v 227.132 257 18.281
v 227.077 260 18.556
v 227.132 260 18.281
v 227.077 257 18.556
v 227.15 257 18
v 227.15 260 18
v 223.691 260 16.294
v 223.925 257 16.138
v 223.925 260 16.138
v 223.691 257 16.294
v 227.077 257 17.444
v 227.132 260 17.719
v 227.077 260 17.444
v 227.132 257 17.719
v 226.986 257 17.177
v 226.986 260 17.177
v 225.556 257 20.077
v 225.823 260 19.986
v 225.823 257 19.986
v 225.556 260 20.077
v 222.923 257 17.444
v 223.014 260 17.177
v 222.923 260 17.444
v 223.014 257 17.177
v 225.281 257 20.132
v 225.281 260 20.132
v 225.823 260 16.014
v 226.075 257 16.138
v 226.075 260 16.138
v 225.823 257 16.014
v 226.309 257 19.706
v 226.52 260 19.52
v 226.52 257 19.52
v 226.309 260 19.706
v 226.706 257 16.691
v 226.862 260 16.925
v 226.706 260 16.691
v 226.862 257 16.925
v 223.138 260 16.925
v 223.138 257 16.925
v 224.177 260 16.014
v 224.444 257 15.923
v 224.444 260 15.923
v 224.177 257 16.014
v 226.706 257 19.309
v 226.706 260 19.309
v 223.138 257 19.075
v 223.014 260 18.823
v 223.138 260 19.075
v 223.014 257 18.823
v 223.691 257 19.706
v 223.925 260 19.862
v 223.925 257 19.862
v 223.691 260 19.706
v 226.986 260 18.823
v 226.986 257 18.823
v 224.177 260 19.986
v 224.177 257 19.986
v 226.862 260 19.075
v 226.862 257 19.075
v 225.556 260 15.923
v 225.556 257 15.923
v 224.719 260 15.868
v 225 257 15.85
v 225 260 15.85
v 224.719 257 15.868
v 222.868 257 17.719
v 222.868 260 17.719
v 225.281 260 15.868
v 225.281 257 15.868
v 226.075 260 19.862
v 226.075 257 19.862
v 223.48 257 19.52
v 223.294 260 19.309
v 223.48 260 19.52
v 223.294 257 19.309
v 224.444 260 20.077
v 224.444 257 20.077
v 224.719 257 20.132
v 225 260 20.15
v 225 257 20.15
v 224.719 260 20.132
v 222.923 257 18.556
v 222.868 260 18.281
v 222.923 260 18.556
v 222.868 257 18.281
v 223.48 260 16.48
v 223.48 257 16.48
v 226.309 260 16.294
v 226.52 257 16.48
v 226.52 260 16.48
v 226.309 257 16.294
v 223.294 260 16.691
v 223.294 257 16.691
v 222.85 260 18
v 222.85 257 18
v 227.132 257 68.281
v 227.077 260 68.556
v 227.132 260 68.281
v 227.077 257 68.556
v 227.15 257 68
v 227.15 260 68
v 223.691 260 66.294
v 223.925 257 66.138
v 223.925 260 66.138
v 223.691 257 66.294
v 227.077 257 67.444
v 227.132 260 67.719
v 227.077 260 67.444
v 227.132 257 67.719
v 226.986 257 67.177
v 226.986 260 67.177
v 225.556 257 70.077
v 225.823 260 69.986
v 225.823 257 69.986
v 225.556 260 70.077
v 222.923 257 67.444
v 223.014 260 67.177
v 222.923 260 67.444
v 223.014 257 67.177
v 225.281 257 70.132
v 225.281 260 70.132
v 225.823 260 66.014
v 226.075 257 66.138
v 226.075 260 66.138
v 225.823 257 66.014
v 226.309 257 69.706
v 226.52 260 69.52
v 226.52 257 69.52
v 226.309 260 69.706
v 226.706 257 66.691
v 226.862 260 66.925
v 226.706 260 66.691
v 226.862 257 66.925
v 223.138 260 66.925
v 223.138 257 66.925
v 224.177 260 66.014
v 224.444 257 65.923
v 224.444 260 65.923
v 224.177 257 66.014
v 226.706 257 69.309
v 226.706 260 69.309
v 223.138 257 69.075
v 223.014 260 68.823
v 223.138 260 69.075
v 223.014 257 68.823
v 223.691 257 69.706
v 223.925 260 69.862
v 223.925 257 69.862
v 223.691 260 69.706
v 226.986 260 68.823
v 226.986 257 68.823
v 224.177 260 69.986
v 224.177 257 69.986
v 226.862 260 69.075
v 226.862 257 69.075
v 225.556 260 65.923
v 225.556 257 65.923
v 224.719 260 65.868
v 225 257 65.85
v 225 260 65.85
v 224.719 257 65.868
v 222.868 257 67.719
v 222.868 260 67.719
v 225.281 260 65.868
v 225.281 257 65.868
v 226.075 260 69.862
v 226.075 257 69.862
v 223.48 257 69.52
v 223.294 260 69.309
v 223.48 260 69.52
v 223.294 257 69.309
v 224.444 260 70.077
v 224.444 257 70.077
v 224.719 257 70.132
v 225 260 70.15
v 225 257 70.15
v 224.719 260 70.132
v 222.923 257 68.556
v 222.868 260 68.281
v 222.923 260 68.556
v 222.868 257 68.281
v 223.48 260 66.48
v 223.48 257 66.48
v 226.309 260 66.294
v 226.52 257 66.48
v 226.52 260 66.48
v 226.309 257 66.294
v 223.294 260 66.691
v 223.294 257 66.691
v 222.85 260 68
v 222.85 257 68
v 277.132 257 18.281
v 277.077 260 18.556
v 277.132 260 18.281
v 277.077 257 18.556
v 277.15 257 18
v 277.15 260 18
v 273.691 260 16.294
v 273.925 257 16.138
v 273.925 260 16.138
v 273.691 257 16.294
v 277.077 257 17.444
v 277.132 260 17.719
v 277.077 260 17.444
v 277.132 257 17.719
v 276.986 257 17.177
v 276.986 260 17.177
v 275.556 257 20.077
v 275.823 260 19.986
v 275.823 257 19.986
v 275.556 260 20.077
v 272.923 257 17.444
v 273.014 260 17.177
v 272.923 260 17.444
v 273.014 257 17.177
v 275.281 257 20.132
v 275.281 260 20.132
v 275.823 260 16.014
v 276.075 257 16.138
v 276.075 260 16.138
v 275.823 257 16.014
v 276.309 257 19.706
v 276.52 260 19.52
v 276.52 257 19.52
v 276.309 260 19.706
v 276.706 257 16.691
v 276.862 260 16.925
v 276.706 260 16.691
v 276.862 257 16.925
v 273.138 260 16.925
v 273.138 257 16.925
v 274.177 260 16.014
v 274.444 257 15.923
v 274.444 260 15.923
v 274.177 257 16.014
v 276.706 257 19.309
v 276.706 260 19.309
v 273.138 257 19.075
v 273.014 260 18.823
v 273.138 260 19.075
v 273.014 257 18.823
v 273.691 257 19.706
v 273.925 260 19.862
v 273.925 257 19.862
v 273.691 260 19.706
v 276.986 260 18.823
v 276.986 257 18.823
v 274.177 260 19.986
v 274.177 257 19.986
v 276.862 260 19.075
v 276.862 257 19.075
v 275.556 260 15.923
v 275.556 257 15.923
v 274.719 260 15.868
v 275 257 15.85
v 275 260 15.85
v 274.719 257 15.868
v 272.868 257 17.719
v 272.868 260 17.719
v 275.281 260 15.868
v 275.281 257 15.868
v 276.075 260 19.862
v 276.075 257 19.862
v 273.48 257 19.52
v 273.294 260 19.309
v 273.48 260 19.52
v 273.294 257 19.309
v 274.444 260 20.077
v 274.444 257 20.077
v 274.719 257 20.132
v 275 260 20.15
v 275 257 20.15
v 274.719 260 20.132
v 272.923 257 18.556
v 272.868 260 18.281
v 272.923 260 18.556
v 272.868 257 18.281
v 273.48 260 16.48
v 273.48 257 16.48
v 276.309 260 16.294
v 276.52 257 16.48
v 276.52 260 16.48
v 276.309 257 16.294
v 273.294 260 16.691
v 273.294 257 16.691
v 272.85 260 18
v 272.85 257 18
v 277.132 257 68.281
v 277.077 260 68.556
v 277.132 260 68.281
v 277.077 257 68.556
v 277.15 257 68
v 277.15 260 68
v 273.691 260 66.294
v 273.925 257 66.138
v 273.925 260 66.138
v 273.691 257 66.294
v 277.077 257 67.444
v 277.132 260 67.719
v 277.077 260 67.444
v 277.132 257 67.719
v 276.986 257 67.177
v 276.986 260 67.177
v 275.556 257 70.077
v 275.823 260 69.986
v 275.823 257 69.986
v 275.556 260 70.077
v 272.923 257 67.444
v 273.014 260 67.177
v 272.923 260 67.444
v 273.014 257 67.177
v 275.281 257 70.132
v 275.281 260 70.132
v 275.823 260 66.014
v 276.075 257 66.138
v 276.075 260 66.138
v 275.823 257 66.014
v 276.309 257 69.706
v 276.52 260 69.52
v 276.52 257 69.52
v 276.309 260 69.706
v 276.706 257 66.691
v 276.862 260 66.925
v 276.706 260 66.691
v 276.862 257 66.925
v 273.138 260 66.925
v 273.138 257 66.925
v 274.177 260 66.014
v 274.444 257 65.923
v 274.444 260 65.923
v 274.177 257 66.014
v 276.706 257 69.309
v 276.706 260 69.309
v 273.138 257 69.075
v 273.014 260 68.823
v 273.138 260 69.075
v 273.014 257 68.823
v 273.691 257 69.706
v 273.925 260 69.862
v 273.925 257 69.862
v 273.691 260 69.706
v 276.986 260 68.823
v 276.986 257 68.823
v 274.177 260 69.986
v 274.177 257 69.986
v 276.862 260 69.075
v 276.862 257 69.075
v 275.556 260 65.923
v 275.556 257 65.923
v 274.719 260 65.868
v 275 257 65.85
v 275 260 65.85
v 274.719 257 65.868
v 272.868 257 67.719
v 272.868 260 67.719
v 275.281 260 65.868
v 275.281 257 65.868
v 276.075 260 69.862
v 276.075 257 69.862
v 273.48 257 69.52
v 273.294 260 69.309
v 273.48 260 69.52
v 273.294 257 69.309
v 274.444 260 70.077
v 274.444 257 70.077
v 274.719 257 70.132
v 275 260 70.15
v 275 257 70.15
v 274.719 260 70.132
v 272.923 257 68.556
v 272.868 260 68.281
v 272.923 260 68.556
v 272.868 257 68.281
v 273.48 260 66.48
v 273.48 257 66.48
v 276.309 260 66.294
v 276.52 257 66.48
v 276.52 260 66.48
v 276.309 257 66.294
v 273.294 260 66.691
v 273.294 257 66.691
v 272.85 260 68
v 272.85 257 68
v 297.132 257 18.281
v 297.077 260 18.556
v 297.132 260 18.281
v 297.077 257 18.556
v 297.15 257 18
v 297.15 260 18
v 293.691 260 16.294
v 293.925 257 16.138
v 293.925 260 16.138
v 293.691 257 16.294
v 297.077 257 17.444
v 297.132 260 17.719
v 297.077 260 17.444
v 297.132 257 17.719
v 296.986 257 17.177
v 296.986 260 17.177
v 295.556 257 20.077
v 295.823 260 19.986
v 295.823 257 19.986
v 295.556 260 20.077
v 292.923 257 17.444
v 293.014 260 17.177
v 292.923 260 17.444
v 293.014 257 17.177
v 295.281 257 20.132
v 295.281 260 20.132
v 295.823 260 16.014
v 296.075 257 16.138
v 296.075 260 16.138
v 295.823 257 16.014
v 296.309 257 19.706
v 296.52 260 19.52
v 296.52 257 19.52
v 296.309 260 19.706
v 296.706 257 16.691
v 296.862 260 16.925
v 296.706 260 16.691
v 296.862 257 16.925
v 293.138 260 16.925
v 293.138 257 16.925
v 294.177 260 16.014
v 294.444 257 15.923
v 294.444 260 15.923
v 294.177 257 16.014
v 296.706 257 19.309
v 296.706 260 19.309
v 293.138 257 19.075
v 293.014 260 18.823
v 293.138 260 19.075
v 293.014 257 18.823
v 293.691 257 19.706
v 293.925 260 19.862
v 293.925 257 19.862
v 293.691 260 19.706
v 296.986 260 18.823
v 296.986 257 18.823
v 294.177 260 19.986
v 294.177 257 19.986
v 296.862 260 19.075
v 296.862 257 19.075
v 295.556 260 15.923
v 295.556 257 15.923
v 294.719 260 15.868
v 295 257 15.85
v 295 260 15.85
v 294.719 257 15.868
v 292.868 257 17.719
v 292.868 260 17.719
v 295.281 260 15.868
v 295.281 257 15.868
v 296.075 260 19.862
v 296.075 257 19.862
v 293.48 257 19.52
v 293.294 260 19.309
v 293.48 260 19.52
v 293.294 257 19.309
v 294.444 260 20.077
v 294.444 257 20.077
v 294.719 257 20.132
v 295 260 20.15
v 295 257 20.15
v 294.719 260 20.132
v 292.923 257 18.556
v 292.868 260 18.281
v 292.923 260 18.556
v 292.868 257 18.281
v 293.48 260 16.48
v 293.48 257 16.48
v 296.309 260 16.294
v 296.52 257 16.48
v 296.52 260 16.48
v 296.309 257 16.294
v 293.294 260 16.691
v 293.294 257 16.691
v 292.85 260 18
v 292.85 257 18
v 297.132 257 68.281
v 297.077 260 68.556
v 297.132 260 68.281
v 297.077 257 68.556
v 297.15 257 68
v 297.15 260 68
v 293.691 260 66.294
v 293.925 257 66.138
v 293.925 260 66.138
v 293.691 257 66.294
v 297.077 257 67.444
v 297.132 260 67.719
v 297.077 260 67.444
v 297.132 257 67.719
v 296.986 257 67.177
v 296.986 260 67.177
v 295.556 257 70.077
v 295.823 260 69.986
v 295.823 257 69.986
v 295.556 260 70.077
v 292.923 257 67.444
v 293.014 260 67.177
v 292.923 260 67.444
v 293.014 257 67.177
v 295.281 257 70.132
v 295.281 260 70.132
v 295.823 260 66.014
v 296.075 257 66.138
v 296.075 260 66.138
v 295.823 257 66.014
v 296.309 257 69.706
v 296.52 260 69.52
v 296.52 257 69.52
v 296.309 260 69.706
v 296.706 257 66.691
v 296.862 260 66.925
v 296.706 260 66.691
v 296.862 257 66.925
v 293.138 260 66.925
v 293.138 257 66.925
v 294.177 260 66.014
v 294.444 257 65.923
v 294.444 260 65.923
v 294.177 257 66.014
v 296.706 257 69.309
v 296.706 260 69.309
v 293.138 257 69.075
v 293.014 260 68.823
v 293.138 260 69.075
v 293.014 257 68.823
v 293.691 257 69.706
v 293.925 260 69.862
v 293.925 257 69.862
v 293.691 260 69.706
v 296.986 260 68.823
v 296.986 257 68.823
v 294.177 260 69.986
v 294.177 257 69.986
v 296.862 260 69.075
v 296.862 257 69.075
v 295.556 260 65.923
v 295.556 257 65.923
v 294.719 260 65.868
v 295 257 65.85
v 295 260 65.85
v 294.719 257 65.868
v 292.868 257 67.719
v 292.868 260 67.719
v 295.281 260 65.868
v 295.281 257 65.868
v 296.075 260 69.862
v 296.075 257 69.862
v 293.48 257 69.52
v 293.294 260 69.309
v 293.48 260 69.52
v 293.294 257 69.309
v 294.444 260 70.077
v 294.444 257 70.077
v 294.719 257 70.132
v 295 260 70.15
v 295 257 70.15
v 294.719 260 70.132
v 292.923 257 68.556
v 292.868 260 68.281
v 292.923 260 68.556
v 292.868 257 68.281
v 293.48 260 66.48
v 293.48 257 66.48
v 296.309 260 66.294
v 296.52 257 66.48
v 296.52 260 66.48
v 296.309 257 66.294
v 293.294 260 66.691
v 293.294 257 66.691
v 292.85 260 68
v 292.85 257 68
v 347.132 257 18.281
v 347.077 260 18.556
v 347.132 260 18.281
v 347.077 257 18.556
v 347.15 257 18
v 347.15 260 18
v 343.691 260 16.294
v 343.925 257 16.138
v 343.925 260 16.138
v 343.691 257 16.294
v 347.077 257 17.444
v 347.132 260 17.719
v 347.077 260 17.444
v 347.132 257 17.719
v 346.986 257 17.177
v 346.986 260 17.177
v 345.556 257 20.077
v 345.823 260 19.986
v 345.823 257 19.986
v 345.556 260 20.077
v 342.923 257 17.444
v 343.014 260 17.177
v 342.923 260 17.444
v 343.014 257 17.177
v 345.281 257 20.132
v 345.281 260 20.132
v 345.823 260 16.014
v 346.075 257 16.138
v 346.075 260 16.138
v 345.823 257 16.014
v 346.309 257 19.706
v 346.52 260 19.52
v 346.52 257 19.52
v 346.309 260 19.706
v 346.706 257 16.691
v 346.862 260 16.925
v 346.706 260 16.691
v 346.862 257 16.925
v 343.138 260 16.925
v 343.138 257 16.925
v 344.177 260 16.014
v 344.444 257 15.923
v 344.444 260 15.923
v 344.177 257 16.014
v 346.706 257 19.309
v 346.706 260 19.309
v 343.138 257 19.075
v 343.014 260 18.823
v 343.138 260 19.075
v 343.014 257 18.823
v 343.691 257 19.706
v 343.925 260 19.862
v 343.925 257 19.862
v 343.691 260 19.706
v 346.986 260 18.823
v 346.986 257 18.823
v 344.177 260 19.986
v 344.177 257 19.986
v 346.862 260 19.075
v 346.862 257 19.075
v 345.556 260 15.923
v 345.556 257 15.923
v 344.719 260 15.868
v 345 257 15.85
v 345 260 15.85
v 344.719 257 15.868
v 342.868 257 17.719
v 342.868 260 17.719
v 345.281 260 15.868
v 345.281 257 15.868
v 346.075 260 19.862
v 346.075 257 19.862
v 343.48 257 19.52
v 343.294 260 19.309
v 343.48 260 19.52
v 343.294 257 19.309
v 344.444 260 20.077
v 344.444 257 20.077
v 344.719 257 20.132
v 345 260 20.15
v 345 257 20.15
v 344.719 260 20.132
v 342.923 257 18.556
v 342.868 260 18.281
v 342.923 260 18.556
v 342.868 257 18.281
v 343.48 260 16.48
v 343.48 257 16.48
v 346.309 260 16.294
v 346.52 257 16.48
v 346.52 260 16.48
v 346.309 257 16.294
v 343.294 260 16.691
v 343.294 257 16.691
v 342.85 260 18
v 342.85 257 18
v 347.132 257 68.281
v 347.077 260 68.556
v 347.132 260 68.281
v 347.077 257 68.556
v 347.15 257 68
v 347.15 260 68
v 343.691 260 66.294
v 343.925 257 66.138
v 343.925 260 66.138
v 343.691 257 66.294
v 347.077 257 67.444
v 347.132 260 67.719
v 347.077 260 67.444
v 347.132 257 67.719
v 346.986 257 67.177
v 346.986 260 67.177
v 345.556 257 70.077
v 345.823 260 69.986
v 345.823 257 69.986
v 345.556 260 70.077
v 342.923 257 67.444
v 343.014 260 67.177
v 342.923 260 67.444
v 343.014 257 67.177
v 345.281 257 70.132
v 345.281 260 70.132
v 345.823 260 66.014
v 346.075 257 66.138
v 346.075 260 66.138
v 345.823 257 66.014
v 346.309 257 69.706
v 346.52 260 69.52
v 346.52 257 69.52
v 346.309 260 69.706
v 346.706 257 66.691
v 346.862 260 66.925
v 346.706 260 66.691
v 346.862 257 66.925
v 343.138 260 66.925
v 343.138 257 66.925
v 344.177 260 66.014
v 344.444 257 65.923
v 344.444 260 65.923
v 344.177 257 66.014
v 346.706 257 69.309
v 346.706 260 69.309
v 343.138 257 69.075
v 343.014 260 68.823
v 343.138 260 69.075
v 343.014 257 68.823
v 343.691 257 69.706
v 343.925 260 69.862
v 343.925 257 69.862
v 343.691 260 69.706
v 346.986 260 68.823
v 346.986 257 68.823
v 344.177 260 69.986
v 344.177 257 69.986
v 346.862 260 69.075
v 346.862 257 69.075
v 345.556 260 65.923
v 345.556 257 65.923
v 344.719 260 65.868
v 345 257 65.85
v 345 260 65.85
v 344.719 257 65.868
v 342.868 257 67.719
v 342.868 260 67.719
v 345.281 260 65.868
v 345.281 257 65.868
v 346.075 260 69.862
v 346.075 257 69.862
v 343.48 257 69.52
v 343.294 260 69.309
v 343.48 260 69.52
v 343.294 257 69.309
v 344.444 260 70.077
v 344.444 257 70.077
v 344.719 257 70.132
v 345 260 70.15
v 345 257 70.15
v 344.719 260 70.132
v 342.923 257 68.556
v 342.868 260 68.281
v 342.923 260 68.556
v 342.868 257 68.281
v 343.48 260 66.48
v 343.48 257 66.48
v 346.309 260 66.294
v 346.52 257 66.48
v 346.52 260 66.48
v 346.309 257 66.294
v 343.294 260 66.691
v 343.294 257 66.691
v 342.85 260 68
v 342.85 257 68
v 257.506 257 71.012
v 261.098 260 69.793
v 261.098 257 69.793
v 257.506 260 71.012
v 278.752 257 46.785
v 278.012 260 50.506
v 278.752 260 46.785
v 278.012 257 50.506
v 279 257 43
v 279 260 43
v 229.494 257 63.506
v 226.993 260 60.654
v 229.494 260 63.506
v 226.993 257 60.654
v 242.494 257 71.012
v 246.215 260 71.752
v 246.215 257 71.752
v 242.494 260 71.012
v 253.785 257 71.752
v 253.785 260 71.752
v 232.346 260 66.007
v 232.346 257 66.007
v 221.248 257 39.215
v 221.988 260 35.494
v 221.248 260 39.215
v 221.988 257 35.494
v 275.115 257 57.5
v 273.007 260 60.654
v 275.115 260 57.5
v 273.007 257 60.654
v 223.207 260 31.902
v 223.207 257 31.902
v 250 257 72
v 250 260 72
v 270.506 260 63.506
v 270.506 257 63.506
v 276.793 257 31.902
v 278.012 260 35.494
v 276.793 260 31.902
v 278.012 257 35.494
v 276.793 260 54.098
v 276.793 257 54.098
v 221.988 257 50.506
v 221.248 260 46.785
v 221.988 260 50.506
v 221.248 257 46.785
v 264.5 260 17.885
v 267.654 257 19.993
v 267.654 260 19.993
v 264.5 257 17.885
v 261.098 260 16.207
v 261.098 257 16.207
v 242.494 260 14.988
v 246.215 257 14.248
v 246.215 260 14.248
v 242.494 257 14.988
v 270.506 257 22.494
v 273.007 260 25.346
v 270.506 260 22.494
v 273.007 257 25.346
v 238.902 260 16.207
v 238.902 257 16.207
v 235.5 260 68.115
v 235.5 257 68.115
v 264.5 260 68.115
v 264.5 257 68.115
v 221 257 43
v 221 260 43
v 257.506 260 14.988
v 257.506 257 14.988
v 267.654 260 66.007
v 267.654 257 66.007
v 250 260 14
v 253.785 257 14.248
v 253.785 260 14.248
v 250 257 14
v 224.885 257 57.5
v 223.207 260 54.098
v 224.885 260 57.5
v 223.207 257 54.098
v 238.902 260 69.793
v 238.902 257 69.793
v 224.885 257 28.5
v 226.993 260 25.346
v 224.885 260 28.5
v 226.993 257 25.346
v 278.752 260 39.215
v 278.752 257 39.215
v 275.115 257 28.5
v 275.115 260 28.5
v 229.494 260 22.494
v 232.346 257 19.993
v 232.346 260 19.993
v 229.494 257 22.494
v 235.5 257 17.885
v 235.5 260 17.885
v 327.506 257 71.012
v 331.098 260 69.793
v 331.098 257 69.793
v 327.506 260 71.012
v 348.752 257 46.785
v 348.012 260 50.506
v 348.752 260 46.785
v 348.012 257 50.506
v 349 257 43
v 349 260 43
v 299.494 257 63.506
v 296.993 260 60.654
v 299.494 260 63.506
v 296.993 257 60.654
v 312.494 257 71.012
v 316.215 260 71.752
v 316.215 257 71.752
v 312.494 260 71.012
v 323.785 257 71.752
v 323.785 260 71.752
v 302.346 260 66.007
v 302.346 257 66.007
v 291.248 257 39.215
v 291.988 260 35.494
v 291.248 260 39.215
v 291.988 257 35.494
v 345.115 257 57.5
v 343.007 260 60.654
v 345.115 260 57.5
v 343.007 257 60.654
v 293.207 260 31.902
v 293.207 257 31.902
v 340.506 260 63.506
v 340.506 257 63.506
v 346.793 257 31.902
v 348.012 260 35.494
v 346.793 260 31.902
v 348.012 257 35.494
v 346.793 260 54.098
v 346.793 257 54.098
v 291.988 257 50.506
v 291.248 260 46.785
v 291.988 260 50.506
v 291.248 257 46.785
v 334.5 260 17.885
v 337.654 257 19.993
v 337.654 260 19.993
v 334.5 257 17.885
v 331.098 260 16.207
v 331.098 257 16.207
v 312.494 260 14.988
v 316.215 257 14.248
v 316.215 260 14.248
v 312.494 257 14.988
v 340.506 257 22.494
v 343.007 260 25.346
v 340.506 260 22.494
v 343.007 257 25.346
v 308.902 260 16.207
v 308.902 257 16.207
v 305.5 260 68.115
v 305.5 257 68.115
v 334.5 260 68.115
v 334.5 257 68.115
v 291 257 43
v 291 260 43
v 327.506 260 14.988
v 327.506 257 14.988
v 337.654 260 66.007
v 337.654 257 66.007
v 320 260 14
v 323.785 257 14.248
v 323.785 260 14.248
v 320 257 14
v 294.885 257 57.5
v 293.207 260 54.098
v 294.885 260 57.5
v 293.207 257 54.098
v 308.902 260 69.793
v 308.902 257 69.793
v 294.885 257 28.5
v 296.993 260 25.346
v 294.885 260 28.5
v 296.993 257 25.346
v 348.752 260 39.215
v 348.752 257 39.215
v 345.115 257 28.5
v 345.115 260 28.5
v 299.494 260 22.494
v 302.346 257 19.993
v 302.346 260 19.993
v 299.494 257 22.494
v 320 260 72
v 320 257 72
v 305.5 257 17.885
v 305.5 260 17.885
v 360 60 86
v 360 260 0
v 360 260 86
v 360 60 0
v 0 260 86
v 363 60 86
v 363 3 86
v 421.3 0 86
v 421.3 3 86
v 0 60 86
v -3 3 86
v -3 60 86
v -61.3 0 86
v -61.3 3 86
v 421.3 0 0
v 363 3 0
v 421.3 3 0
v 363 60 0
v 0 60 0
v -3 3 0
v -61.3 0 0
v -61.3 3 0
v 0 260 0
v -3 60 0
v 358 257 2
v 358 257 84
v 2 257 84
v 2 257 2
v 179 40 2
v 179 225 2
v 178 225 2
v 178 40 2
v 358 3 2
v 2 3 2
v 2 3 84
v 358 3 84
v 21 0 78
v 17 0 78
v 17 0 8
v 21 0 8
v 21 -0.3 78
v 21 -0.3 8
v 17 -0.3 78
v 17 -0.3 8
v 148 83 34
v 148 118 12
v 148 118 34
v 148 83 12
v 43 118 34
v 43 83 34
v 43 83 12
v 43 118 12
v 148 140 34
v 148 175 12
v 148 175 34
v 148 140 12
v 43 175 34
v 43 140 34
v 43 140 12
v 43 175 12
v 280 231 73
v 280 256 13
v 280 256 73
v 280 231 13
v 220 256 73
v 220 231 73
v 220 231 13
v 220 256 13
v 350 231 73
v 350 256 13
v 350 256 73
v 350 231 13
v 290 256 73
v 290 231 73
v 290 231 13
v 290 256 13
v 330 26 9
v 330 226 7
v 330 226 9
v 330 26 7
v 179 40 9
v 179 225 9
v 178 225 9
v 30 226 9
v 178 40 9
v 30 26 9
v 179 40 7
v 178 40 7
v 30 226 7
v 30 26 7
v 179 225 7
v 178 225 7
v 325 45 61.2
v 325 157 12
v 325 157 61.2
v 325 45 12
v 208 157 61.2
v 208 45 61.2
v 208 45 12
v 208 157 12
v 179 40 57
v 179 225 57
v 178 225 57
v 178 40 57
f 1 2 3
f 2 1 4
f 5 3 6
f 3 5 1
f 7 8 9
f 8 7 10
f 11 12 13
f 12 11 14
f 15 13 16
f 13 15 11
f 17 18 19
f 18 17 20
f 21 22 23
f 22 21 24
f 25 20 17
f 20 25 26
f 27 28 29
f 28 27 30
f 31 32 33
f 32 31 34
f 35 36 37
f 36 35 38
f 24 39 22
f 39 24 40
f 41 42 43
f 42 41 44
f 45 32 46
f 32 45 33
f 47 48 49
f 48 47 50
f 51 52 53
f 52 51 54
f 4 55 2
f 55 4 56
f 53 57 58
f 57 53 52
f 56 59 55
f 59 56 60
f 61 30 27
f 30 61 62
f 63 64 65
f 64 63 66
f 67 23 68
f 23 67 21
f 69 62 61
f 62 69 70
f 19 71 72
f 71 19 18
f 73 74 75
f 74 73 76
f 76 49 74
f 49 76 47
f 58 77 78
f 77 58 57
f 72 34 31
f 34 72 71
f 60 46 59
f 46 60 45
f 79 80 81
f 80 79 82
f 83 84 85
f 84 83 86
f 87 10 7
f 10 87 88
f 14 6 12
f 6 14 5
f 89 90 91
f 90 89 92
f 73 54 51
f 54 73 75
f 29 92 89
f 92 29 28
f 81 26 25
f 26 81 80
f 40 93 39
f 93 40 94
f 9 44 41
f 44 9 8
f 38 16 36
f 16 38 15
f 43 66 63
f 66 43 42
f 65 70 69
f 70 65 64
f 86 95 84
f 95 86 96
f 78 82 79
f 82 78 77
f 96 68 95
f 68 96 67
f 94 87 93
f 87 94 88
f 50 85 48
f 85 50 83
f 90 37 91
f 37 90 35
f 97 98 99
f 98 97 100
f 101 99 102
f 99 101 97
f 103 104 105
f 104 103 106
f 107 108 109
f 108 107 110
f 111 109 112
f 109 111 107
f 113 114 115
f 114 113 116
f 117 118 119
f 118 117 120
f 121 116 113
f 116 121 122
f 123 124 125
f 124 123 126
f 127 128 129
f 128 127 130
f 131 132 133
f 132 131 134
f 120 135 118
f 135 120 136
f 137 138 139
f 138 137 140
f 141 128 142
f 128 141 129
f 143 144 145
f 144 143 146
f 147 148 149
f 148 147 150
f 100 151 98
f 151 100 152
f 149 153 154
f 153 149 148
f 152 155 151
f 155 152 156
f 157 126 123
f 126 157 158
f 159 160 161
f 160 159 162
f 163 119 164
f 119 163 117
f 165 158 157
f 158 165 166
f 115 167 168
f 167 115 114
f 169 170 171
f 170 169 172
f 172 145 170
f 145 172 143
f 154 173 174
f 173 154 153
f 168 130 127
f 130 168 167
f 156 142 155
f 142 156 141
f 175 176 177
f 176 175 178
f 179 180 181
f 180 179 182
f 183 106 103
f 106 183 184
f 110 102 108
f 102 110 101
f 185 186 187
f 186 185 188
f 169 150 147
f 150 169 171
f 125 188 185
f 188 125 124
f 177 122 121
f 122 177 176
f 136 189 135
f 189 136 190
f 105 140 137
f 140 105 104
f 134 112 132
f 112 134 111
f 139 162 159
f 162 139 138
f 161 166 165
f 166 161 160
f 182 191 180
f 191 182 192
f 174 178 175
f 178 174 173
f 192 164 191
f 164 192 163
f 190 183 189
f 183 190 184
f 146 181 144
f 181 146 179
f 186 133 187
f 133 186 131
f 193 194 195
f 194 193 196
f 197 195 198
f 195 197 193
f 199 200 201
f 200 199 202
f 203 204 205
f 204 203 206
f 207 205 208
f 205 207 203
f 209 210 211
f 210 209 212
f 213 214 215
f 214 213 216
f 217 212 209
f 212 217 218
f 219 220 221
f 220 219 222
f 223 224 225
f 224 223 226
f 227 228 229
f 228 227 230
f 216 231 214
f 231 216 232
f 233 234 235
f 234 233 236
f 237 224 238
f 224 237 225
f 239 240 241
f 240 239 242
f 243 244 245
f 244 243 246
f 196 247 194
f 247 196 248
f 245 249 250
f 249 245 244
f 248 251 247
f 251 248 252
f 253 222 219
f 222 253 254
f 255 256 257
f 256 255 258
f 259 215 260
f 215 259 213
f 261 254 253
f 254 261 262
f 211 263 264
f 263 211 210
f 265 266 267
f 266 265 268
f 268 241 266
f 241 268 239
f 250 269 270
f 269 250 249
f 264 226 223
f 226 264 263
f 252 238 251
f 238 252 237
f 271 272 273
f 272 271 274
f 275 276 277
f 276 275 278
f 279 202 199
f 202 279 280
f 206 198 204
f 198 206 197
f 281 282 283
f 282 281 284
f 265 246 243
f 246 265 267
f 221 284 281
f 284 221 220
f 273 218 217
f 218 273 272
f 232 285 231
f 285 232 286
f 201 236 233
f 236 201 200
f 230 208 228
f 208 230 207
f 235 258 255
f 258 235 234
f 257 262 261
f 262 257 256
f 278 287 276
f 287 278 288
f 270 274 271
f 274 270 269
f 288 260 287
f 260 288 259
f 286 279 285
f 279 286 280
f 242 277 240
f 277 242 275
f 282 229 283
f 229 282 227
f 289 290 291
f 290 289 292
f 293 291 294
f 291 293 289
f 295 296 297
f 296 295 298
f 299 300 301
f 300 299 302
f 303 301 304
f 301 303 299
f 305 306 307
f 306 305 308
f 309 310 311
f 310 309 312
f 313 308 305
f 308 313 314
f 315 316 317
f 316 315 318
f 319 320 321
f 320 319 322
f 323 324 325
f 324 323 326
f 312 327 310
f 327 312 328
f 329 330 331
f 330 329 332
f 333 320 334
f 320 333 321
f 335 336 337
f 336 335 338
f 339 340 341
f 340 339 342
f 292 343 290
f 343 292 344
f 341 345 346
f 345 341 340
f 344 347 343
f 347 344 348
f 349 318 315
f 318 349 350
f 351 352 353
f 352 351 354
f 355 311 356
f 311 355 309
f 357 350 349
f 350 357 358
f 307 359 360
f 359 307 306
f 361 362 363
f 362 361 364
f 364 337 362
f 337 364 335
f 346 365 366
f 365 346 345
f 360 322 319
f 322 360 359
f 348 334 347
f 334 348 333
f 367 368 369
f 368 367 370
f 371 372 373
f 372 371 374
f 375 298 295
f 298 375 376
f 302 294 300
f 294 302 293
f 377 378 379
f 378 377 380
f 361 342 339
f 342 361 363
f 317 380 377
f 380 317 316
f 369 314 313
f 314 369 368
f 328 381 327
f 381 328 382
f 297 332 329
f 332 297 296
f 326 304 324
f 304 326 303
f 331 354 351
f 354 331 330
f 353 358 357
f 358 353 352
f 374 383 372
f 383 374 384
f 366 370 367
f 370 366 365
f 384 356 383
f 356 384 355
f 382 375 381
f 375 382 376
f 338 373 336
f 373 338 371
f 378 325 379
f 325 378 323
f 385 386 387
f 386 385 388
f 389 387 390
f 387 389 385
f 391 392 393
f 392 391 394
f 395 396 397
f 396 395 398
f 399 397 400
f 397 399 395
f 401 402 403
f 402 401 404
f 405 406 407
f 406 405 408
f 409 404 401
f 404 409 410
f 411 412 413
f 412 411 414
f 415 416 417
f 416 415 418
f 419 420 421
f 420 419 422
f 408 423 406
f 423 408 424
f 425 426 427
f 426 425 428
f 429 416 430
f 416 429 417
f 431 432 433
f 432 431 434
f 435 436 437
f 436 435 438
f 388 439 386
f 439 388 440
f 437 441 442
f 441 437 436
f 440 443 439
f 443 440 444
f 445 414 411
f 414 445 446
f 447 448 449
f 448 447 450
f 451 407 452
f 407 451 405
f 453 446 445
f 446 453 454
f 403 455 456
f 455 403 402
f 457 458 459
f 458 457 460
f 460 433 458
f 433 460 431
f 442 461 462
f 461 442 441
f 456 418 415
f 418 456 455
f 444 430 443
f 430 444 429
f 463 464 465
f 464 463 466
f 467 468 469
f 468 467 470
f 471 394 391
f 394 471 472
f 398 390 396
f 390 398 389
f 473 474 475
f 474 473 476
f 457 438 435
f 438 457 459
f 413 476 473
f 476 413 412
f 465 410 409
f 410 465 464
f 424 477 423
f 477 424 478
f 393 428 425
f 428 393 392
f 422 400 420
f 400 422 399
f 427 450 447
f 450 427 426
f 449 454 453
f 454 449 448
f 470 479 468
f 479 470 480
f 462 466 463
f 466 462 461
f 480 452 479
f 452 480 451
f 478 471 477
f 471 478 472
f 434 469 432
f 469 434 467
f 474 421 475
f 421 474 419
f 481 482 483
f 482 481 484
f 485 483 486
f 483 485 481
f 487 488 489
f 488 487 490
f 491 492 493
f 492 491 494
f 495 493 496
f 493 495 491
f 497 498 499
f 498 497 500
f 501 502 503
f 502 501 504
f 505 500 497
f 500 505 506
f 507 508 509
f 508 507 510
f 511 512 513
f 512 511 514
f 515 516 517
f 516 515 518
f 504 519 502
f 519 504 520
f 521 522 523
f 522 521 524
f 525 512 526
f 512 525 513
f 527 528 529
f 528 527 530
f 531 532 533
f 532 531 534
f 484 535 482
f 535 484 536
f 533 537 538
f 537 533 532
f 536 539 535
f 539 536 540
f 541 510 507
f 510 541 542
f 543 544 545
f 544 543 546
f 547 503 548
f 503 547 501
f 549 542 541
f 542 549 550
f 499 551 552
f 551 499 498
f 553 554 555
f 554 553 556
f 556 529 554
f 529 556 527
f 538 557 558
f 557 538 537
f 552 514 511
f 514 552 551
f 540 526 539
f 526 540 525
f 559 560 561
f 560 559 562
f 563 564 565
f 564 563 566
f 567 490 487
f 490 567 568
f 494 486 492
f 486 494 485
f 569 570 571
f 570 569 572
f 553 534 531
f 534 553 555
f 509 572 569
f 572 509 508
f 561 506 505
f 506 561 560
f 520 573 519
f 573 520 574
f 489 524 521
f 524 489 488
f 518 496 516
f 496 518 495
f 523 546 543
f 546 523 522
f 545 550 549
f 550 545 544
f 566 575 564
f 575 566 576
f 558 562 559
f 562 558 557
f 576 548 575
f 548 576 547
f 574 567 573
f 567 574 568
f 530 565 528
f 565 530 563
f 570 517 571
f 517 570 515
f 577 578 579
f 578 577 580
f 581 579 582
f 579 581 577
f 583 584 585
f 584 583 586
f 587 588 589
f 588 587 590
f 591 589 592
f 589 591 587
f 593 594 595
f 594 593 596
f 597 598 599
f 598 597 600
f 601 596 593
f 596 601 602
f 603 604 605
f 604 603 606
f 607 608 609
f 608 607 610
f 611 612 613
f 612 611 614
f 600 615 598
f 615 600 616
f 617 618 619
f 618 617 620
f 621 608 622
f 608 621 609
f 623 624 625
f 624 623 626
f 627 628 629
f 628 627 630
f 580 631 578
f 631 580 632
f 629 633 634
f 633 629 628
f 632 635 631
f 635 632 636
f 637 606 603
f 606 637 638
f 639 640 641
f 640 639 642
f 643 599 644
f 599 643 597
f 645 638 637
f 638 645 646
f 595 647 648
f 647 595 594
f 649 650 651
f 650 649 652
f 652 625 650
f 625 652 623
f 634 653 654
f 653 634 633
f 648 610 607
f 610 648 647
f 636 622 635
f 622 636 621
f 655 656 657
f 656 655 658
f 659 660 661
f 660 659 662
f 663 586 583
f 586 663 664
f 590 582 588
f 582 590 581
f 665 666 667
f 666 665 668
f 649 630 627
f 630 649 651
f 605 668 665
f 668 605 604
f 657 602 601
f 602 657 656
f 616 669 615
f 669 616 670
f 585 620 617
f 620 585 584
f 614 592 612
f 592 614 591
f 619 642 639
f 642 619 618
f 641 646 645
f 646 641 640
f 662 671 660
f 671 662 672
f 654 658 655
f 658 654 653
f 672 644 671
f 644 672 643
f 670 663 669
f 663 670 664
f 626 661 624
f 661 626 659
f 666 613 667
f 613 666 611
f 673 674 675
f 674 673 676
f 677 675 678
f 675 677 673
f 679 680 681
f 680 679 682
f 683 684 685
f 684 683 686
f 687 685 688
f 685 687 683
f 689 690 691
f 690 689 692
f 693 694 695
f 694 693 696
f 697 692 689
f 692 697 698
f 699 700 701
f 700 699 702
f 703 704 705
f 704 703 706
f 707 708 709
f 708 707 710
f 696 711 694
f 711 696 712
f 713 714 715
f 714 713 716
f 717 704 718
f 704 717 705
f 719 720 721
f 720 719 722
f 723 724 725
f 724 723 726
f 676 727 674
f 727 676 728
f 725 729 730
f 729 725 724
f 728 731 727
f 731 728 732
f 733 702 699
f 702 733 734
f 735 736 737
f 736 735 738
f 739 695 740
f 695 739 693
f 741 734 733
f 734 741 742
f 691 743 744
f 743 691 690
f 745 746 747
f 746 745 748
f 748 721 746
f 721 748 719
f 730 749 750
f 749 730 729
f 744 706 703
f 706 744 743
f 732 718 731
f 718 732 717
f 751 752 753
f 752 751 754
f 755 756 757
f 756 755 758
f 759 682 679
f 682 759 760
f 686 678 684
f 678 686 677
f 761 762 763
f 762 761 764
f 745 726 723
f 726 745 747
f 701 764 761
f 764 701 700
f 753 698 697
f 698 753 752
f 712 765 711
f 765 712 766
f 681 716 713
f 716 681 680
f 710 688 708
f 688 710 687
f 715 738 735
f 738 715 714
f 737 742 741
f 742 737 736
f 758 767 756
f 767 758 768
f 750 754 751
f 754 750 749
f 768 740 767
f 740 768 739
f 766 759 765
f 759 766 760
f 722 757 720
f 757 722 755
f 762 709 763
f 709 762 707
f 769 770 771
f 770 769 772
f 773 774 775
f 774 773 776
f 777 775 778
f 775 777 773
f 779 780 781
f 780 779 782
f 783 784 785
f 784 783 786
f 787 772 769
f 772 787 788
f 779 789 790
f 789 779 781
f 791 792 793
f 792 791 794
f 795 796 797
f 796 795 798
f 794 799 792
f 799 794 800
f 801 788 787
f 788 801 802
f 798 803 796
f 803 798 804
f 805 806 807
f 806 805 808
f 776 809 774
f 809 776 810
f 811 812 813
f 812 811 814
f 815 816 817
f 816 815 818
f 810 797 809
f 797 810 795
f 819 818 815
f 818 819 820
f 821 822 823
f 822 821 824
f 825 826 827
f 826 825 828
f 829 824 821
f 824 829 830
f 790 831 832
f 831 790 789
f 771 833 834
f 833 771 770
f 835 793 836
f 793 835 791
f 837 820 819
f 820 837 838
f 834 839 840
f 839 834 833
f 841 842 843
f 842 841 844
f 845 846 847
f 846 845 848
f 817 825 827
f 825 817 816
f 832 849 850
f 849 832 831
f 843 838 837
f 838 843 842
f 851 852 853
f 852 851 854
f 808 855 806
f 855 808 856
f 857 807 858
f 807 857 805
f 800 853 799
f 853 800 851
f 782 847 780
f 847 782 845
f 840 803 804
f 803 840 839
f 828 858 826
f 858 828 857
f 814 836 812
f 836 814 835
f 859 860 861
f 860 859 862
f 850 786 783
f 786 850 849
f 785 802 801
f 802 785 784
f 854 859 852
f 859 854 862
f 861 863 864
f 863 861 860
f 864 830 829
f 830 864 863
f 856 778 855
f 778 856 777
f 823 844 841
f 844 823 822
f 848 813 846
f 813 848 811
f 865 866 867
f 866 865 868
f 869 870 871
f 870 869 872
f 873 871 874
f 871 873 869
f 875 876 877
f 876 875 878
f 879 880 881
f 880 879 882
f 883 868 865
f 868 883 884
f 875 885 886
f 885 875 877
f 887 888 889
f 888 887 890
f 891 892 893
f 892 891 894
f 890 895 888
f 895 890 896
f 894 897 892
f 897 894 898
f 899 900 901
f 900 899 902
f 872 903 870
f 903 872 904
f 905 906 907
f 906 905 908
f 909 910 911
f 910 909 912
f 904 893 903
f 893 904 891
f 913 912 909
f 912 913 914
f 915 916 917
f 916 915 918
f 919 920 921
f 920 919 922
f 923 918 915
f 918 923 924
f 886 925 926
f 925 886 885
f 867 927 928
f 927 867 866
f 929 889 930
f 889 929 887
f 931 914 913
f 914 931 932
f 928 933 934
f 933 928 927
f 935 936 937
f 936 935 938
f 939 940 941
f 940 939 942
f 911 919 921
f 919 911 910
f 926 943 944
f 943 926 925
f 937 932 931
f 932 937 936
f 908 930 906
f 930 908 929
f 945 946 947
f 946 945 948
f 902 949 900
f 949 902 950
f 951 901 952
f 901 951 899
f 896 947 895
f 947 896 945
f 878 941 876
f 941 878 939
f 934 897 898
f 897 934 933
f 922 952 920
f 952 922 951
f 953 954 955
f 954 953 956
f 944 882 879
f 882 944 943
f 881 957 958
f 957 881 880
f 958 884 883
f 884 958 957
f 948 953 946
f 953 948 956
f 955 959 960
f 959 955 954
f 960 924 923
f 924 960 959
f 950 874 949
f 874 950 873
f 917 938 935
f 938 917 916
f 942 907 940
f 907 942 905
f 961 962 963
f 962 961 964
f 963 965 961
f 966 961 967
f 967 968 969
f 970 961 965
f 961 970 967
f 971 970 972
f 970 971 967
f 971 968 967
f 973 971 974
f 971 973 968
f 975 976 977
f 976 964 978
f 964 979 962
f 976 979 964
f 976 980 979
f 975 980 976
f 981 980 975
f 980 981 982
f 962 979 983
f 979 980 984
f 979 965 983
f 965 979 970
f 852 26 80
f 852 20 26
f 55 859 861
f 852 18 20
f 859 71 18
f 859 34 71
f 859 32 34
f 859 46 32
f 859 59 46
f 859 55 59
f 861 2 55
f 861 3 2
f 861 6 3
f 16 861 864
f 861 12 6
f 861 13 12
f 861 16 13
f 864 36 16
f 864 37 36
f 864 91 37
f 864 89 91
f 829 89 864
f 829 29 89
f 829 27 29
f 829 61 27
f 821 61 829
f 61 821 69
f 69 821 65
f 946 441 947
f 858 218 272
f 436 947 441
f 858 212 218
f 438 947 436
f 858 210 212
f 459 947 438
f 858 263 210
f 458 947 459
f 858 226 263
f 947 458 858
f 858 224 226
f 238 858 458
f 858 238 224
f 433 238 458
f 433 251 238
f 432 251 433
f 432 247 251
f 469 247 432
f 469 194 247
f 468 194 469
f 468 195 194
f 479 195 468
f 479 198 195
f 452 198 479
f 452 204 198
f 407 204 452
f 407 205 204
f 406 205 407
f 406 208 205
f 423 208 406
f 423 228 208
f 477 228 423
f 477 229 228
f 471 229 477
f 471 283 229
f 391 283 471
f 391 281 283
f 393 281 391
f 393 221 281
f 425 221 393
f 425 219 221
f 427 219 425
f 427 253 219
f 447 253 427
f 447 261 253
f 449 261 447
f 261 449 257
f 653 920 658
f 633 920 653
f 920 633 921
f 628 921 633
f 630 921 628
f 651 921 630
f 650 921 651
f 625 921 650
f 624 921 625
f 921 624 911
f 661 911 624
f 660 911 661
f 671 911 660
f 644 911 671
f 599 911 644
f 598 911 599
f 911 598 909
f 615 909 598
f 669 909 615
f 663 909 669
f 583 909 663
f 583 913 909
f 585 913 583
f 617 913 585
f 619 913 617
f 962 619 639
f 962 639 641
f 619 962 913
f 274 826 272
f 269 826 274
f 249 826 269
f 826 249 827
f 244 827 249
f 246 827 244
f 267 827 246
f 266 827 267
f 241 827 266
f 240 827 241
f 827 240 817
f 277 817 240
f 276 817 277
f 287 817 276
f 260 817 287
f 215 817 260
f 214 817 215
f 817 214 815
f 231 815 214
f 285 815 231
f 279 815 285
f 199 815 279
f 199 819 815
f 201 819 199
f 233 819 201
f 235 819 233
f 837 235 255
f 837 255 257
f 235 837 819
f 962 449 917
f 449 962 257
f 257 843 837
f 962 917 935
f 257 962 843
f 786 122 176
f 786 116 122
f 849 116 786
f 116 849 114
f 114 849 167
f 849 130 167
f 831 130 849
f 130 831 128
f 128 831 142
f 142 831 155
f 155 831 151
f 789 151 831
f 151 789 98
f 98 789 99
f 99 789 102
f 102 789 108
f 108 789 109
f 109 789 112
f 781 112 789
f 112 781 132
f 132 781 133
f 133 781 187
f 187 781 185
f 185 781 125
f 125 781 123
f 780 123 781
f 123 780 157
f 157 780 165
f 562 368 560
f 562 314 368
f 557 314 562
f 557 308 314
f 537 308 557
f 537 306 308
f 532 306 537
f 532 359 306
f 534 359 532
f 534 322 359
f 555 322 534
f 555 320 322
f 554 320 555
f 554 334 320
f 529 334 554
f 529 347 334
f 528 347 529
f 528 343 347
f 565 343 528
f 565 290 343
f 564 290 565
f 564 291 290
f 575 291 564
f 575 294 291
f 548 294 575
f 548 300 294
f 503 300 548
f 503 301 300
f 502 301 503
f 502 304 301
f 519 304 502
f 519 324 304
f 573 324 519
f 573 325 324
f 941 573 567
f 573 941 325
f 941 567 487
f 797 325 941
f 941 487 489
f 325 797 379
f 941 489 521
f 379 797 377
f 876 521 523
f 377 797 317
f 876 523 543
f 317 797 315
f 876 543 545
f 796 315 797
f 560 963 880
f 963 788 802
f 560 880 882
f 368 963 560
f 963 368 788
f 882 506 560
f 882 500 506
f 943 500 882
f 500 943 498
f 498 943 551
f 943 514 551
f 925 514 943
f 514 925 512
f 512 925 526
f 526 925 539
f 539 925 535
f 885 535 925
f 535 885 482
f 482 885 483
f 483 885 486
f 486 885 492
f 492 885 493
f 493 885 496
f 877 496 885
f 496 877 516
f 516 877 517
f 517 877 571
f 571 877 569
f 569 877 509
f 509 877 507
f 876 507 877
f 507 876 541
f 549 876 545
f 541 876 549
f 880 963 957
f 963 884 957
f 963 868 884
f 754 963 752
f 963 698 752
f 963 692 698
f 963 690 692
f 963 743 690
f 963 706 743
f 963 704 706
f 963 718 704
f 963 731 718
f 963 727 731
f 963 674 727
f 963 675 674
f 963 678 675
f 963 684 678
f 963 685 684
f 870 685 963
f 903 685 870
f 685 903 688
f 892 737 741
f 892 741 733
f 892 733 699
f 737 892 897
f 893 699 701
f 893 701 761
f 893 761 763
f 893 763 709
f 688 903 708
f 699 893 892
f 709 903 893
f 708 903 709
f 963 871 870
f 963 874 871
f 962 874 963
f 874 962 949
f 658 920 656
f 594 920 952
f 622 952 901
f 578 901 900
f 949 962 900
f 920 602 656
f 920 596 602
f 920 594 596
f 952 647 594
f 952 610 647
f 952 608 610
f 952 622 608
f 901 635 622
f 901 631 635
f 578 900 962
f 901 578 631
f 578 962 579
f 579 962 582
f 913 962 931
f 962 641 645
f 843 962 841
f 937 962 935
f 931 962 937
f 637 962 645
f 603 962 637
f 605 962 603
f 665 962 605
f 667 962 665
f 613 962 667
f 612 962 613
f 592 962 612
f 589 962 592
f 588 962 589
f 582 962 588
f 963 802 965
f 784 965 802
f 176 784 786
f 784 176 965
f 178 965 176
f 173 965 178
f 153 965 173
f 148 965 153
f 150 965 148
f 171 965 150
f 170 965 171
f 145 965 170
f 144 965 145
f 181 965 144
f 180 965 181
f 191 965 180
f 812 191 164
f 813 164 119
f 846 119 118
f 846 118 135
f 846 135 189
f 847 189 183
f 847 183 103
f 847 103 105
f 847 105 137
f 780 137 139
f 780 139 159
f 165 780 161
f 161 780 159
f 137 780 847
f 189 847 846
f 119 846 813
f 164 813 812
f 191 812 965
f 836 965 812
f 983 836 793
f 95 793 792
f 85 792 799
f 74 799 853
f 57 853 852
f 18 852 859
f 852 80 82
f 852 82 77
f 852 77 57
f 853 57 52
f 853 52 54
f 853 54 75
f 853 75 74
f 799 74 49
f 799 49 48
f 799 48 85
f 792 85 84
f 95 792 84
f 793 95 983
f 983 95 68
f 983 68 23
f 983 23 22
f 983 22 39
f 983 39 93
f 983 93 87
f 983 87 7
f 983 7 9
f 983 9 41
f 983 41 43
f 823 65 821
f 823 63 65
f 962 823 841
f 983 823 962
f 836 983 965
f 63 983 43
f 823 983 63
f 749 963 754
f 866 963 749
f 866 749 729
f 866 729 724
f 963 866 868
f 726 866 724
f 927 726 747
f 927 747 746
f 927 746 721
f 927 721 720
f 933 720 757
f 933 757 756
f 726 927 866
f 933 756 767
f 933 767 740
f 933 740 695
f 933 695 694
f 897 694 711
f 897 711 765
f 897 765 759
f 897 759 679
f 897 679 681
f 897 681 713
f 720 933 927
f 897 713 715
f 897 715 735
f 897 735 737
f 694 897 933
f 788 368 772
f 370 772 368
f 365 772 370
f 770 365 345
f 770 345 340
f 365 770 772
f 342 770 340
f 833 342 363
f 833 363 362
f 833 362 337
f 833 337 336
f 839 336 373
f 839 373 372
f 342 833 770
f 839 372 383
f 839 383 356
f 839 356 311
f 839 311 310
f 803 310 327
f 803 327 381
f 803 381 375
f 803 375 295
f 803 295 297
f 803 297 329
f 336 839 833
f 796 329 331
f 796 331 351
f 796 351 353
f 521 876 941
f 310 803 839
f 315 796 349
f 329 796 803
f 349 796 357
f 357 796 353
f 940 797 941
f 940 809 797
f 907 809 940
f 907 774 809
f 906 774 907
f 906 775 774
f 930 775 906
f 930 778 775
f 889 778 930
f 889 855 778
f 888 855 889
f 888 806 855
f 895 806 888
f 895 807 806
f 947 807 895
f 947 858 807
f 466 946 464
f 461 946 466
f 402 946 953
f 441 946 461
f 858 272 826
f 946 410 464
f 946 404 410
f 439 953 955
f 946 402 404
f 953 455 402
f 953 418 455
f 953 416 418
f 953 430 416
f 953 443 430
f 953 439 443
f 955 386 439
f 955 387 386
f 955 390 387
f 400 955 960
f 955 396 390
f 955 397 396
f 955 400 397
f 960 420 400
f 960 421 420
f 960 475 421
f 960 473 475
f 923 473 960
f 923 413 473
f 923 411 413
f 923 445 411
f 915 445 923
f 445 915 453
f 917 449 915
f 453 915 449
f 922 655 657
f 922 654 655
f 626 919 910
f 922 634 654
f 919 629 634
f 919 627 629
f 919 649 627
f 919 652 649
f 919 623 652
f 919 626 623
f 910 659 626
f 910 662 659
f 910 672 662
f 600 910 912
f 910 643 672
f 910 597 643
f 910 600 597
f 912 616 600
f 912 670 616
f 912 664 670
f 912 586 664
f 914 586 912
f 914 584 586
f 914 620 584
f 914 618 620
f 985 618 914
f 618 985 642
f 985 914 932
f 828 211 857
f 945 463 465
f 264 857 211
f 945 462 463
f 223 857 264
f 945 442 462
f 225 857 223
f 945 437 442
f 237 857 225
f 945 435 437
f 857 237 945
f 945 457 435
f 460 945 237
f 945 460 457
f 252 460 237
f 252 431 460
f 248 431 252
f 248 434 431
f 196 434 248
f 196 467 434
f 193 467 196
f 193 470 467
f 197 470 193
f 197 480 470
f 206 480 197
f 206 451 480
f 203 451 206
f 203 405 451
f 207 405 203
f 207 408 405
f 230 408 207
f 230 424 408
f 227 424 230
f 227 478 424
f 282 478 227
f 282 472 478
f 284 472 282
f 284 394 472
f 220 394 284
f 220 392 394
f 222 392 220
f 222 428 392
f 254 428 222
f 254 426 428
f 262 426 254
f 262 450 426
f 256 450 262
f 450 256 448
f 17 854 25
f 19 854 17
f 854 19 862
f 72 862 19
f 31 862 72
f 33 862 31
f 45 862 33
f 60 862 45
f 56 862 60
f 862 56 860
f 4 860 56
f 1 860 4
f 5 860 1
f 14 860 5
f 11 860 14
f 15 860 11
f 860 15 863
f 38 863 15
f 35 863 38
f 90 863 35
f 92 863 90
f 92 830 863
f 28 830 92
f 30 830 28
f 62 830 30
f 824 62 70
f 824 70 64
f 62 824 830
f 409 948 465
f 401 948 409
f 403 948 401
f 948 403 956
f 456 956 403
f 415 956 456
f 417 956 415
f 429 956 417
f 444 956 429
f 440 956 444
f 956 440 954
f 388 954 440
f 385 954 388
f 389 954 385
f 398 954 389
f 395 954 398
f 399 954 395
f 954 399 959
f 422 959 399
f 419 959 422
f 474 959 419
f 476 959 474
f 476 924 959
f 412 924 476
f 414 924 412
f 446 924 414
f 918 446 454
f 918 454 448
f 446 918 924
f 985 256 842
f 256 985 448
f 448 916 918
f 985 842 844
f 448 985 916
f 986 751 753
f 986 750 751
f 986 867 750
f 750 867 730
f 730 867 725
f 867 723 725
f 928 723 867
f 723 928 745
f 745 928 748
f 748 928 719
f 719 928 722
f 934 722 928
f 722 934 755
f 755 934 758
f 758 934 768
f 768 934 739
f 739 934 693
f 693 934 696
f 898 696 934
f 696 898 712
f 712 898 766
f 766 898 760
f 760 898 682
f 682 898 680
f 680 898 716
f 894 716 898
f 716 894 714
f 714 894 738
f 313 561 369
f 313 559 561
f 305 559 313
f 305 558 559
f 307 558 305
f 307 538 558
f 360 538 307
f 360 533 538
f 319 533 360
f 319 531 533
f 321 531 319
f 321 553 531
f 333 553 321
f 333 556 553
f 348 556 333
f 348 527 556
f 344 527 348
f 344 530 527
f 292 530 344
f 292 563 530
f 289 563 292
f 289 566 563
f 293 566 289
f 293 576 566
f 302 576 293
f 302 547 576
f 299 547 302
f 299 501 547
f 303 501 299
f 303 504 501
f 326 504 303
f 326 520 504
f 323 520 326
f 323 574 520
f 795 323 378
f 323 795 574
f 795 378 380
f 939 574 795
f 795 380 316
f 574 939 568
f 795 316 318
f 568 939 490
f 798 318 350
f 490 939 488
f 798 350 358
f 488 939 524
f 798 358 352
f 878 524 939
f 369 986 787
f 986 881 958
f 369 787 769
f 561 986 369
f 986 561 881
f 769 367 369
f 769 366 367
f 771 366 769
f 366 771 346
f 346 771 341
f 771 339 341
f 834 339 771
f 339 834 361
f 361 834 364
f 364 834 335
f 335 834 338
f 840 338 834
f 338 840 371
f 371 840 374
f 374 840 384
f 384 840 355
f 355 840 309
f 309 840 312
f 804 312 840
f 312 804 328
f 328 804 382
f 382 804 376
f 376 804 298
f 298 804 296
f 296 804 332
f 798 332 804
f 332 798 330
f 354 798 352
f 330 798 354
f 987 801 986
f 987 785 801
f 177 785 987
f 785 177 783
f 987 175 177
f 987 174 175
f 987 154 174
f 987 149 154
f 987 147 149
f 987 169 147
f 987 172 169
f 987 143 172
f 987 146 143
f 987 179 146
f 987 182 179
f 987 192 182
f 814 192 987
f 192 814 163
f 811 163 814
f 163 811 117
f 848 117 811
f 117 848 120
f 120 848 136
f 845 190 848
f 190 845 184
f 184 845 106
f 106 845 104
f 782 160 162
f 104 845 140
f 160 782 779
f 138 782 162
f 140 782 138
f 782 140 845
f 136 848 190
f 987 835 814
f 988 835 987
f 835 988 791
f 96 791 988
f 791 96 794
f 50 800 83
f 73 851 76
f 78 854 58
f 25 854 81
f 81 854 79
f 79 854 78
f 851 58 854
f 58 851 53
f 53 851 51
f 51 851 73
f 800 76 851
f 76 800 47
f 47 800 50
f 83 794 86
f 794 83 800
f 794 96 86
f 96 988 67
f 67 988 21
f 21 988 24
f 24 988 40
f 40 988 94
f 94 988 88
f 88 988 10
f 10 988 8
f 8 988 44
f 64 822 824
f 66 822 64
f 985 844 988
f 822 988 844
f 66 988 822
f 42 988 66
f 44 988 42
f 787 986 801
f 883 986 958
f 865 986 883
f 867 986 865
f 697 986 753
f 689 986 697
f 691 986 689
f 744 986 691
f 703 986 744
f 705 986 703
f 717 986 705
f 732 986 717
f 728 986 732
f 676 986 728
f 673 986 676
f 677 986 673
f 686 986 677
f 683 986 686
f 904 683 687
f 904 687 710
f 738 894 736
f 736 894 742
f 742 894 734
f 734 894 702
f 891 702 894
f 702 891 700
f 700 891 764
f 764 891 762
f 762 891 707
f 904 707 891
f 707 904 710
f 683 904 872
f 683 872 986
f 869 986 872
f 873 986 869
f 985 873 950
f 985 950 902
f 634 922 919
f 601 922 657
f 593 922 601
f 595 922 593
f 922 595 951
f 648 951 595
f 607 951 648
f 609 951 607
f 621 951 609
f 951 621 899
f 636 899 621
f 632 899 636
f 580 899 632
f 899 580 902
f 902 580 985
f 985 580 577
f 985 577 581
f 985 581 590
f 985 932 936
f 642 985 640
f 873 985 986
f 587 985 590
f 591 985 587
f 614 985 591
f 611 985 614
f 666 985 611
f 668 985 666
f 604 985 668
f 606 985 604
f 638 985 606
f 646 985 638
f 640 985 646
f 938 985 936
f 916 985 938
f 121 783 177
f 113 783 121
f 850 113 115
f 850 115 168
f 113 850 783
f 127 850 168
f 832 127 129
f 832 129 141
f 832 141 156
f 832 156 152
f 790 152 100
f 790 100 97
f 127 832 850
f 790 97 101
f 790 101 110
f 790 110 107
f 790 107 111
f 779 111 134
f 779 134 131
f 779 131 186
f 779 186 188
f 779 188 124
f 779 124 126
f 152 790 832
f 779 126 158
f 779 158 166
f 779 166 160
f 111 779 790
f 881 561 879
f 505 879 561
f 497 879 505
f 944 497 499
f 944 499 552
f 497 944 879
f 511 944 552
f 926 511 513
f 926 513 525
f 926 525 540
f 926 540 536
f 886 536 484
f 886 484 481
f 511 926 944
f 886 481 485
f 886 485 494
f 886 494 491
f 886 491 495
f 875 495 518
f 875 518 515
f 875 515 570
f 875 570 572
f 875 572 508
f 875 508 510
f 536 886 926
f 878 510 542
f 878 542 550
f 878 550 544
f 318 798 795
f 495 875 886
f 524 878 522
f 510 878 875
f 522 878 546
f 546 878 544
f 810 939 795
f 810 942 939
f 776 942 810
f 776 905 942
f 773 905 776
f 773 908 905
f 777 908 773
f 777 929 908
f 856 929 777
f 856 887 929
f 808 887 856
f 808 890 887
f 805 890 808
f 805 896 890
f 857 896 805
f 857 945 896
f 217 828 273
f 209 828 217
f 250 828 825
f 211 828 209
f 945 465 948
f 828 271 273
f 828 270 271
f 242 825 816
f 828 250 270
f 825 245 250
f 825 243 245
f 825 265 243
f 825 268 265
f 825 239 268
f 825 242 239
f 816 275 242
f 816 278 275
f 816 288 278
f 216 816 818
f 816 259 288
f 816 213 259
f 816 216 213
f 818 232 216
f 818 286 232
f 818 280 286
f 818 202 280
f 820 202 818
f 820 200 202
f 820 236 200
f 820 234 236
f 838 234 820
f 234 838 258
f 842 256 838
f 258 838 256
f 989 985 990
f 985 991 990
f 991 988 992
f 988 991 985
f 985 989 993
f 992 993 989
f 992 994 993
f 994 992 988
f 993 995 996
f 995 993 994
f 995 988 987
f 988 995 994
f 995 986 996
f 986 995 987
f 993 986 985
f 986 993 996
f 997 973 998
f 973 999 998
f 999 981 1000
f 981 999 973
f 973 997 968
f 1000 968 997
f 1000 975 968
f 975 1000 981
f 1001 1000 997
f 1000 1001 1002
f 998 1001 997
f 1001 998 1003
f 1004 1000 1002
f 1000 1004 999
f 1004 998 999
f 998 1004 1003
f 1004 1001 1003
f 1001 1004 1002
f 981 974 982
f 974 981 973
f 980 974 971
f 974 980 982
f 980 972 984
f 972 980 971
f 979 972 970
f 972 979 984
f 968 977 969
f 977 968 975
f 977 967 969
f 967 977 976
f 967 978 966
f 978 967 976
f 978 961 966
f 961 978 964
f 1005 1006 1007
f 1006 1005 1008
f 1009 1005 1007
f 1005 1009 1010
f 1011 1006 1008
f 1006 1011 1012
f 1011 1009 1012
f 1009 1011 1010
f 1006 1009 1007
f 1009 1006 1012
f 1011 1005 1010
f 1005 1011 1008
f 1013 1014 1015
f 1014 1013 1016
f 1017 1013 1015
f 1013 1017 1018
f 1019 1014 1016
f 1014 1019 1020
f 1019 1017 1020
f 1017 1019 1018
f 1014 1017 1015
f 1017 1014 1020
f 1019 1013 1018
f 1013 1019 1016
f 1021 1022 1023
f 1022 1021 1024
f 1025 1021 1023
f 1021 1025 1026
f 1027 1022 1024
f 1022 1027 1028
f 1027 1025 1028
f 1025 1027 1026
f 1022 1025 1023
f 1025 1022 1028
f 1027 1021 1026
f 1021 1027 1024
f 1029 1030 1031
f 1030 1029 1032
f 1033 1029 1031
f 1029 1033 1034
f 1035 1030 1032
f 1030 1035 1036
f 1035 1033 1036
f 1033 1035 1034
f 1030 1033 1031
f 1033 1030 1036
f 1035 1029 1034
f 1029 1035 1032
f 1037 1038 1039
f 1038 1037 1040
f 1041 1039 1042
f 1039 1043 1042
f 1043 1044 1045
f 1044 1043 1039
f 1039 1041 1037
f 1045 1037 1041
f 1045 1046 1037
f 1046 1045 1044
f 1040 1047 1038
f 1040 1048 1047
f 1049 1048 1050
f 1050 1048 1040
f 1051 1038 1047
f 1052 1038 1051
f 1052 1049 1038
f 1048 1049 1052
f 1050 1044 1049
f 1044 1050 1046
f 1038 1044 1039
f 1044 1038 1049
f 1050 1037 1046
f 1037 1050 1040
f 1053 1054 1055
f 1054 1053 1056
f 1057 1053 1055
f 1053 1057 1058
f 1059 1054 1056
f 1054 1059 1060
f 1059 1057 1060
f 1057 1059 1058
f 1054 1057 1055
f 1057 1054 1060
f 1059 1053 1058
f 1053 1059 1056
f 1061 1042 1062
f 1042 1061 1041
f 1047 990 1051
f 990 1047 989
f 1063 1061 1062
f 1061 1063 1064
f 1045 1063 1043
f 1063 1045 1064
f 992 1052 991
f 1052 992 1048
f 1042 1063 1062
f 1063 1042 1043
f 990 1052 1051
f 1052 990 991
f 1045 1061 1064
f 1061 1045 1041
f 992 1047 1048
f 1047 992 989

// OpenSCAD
// BIEM BM-ICC-08 original RFQ/EVT Rev A. Not released manufacturing CAD.
// Connector positions and actuator are sample-dependent. Dimensions in mm.
W=360; D=260; H=86; t=2; panel=3; rack=true; lid=true; internals=true;
$fn=48;
module rear(){
 difference(){
  translate([0,D-panel,0]) cube([W,panel,H]);
  for(x=[250,320]){
   translate([x,D+1,43])rotate([90,0,0])cylinder(h=panel+2,r=29);
   for(dx=[-25,25],dz=[-25,25])translate([x+dx,D+1,43+dz])rotate([90,0,0])cylinder(h=panel+2,r=2.15);
  }
 }
}
module chassis(){
 color([.18,.20,.23]){
  translate([0,panel,0])cube([W,D-2*panel,t]);
  translate([0,panel,t])cube([t,D-2*panel,H-2*t]);
  translate([W-t,panel,t])cube([t,D-2*panel,H-2*t]);
  if(lid)translate([0,panel,H-t])cube([W,D-2*panel,t]);
  rear();
 }
 color([.77,.79,.80])cube([W,panel,H]);
 color([.50,.09,.19])translate([17,-.3,8])cube([4,.3,70]);
}
module ear(right=false){
 sx=right ? W : -61.3;
 color([.15,.17,.20]){
  translate([sx,0,0])cube([61.3,3,H]);
  translate([right ? W : -3,0,0])cube([3,60,H]);
 }
}
chassis();
if(rack){ear(false);ear(true);}
if(internals){
 color([.55,.56,.57])translate([30,26,7])cube([300,200,2]);
 color([.25,.30,.35])translate([208,45,12])cube([117,112,49.2]);
 for(y=[83,140])color([.45,.48,.51])translate([43,y,12])cube([105,35,22]);
 color([.52,.56,.58])translate([178,40,2])cube([1,185,55]);
 for(x=[250,320])color([.34,.28,.20])translate([x-30,231,13])cube([60,25,60]);
}
// Ghost markers: HOLD positions; do not infer finished cutouts.
for(x=[35,70,155,200,112])color([.95,.55,.15,.6])translate([x,D,43])rotate([90,0,0])cylinder(h=2,r=x<100?5:12);
